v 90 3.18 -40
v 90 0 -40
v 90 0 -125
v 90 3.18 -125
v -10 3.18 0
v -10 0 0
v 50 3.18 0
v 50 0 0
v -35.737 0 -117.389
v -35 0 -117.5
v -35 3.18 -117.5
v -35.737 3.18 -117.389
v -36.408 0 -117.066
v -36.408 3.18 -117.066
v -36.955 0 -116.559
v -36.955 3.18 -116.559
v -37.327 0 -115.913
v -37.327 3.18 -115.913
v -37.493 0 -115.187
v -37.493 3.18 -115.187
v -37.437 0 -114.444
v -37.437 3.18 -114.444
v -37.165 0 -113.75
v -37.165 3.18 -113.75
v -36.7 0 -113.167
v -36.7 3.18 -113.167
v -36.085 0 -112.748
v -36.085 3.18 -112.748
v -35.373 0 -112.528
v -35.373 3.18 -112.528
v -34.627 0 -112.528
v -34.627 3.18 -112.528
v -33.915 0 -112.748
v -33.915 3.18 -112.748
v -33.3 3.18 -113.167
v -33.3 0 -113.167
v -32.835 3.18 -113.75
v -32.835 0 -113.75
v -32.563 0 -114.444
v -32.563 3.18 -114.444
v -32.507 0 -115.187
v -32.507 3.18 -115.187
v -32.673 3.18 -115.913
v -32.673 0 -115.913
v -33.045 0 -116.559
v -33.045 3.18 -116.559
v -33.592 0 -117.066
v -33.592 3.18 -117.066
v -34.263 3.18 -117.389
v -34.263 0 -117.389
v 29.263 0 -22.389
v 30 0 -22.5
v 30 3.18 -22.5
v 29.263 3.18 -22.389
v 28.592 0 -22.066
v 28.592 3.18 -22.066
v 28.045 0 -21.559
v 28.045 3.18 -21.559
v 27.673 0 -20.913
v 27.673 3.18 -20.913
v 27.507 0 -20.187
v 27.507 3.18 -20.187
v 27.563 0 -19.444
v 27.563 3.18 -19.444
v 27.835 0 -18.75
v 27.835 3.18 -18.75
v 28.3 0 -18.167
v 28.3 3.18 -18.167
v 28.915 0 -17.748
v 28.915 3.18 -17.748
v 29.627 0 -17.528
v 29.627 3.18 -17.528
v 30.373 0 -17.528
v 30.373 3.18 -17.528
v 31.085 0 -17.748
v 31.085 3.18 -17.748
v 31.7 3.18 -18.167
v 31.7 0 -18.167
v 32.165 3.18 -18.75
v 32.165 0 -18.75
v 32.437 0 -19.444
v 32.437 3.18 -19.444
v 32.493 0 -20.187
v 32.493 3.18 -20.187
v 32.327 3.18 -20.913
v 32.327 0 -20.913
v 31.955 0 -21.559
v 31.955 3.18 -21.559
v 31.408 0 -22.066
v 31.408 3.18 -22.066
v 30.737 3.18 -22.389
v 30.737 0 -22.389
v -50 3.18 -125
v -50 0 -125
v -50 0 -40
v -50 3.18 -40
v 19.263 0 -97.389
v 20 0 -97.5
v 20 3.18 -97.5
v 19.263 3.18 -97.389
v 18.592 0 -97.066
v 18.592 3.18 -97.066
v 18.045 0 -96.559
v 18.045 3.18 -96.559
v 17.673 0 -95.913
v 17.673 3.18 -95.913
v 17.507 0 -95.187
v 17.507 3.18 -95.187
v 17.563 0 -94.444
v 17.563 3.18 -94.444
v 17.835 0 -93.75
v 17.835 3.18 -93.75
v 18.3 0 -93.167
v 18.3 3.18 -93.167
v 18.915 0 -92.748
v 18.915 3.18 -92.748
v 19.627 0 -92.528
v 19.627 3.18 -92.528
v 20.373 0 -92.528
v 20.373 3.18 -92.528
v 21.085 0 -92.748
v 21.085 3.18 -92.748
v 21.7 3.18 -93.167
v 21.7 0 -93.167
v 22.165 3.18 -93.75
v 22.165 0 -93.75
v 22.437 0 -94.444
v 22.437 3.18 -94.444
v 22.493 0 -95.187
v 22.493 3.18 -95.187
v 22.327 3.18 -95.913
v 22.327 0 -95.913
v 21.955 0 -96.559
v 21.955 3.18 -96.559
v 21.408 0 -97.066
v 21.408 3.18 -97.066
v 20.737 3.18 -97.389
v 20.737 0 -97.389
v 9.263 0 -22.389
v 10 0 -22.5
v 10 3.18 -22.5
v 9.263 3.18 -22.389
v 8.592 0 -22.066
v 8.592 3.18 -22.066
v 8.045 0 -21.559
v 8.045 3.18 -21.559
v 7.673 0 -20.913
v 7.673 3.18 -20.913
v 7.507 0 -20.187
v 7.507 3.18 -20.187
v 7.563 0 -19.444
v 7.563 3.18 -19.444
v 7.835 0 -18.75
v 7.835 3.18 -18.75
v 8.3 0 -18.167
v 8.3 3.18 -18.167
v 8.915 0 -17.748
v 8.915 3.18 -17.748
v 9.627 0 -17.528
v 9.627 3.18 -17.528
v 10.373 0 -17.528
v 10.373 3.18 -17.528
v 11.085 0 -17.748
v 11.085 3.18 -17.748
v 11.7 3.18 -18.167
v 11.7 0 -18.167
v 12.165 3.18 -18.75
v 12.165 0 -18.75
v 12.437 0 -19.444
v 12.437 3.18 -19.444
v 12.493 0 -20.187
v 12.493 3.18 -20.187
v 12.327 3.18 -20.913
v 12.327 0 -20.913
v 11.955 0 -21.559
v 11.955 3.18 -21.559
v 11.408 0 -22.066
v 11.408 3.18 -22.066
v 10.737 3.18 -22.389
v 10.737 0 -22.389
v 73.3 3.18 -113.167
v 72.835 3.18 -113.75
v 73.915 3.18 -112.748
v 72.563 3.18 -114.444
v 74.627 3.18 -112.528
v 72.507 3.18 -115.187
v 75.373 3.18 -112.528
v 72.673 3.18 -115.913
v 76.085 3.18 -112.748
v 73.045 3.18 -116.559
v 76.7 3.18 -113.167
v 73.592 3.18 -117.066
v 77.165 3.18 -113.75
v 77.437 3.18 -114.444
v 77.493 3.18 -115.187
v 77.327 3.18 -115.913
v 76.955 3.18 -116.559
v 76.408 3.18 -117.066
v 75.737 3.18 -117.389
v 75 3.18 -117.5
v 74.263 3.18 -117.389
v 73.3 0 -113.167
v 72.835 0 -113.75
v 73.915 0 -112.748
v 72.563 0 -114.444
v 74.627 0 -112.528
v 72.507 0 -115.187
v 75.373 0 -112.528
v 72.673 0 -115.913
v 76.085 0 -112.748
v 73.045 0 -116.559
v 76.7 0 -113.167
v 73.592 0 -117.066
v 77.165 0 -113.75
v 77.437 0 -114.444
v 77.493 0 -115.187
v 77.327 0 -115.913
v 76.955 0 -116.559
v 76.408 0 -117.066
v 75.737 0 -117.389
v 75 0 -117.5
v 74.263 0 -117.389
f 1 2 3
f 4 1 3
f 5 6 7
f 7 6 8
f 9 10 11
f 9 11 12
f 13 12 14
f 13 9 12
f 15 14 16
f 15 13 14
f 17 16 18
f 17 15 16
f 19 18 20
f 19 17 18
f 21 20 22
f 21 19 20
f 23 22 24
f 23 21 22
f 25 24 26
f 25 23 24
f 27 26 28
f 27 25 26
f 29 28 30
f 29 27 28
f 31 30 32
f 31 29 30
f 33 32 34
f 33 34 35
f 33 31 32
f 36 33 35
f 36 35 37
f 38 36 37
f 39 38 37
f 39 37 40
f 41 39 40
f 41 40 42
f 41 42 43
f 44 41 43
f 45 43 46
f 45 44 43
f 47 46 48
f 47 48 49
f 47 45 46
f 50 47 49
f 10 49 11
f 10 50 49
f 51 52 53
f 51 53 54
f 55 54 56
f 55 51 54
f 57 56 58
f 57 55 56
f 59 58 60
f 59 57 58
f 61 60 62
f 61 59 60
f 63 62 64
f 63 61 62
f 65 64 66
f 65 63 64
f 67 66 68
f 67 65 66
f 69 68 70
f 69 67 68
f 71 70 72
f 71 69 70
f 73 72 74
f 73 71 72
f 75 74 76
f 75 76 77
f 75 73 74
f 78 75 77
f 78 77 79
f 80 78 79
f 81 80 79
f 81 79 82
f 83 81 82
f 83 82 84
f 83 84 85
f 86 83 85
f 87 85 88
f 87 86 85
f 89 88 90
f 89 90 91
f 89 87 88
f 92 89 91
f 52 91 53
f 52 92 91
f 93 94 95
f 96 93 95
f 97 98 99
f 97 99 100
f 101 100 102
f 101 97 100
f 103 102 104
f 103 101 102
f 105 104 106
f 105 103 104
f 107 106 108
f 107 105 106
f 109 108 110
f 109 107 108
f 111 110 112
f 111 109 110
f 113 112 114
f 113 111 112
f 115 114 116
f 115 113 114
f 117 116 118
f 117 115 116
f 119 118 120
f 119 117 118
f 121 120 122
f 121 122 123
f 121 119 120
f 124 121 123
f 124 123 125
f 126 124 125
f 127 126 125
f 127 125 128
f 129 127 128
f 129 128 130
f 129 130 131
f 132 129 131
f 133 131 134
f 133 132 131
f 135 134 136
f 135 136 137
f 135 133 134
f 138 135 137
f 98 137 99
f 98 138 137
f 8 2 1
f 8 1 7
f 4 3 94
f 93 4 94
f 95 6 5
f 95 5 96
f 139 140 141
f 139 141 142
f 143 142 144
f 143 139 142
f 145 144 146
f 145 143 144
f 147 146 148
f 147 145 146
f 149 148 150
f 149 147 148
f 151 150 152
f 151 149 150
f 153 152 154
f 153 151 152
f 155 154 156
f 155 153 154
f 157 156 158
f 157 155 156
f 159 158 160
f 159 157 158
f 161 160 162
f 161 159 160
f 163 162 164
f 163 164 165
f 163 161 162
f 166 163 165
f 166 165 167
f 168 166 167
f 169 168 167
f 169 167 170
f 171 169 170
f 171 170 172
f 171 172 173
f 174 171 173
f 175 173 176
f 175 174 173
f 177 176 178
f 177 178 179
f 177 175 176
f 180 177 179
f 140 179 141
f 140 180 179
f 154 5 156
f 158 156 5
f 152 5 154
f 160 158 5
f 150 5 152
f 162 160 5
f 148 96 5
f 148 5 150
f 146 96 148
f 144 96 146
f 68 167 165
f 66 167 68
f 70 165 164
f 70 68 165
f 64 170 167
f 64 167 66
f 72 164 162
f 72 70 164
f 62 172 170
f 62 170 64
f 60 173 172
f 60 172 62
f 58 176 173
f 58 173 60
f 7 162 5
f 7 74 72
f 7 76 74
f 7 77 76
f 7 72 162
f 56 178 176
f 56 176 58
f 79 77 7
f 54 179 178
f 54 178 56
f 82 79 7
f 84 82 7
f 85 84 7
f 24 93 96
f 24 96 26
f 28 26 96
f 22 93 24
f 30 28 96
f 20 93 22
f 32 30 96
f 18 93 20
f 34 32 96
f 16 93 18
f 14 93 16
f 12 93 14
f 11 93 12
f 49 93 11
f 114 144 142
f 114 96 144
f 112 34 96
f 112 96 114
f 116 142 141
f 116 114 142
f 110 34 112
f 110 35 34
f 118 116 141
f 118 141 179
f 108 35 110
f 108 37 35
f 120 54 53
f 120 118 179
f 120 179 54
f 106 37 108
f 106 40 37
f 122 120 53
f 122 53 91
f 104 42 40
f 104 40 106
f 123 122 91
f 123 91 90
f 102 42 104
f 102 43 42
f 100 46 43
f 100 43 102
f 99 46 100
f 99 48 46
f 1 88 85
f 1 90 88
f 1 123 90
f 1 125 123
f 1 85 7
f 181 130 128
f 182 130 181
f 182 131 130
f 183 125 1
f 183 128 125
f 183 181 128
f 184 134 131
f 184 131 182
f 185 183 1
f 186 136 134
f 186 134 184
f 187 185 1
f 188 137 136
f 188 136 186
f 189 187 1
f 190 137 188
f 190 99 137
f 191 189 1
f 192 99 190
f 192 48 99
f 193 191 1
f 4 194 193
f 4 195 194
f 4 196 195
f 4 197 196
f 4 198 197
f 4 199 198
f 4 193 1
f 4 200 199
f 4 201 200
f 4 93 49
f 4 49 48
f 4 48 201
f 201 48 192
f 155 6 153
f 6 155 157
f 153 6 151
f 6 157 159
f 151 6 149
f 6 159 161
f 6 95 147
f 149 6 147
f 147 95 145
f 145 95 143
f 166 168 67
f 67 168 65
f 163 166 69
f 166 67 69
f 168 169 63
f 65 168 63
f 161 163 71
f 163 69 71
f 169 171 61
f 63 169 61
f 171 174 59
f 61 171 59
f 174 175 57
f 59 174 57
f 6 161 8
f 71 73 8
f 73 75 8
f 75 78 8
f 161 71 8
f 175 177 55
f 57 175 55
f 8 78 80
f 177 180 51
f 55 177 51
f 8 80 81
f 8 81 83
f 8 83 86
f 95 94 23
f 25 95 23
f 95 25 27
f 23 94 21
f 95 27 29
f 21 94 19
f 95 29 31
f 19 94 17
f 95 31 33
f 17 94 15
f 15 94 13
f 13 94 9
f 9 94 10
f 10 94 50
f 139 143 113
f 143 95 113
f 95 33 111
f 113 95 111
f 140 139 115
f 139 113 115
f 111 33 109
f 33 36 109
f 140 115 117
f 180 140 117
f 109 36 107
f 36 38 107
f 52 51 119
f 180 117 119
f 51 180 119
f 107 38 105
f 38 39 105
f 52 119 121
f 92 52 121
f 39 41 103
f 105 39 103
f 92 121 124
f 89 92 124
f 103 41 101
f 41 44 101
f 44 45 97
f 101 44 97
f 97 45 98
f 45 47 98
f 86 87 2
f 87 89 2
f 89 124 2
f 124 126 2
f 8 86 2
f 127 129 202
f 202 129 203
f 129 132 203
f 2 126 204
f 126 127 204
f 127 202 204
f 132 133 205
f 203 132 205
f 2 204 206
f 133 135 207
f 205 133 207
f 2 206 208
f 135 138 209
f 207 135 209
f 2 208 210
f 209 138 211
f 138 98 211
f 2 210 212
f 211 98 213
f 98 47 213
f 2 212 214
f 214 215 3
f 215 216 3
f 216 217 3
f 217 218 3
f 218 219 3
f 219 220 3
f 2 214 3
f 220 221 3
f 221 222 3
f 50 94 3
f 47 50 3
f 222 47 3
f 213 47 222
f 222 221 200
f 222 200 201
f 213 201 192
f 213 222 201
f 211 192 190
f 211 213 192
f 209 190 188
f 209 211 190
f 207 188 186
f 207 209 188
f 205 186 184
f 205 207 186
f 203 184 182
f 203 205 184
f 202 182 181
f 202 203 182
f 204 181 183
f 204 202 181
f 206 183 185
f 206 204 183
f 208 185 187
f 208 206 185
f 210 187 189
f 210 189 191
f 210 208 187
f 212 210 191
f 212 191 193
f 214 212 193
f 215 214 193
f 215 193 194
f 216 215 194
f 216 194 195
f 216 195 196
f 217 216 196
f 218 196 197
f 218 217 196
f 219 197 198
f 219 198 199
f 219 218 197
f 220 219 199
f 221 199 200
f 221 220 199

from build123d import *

# Parameters (mm, degrees)
SKETCH1_R           = 2.5
BOSS_EXTRUDE1_DEPTH = 3.18
CUT_EXTRUDE1_DEPTH  = 155.06204075


with BuildPart() as part:
    # Sketch1 → Boss-Extrude1 (new body)
    with BuildSketch(Plane(origin=(0, 0, 0), x_dir=(1, 0, 0), z_dir=(0, 1, 0))):
        Polygon((0, 0), (40, 0), (90, 0), (90, 40), (90, 85), (90, 125), (-50, 125), (-50, 0), align=None)
        with Locations(Location((-35, 115, 0), (0, 0, 90))):
            Circle(SKETCH1_R, mode=Mode.SUBTRACT)
        with Locations(Location((75, 115, 0), (0, 0, 90))):
            Circle(SKETCH1_R, mode=Mode.SUBTRACT)
        with Locations(Location((20, 95, 0), (0, 0, 90))):
            Circle(SKETCH1_R, mode=Mode.SUBTRACT)
        with Locations(Location((10, 20, 0), (0, 0, 90))):
            Circle(SKETCH1_R, mode=Mode.SUBTRACT)
        with Locations(Location((30, 20, 0), (0, 0, 90))):
            Circle(SKETCH1_R, mode=Mode.SUBTRACT)
    extrude(amount=BOSS_EXTRUDE1_DEPTH)

    # Sketch3 → Cut-Extrude1 (cut, through all)
    with BuildSketch(Plane.XZ):
        Polygon((90, -40), (50, 0), (90, 0), align=None)
        Polygon((-50, 0), (-10, 0), (-50, -40), align=None)
    extrude(amount=-CUT_EXTRUDE1_DEPTH, mode=Mode.SUBTRACT)


solid = part.part
